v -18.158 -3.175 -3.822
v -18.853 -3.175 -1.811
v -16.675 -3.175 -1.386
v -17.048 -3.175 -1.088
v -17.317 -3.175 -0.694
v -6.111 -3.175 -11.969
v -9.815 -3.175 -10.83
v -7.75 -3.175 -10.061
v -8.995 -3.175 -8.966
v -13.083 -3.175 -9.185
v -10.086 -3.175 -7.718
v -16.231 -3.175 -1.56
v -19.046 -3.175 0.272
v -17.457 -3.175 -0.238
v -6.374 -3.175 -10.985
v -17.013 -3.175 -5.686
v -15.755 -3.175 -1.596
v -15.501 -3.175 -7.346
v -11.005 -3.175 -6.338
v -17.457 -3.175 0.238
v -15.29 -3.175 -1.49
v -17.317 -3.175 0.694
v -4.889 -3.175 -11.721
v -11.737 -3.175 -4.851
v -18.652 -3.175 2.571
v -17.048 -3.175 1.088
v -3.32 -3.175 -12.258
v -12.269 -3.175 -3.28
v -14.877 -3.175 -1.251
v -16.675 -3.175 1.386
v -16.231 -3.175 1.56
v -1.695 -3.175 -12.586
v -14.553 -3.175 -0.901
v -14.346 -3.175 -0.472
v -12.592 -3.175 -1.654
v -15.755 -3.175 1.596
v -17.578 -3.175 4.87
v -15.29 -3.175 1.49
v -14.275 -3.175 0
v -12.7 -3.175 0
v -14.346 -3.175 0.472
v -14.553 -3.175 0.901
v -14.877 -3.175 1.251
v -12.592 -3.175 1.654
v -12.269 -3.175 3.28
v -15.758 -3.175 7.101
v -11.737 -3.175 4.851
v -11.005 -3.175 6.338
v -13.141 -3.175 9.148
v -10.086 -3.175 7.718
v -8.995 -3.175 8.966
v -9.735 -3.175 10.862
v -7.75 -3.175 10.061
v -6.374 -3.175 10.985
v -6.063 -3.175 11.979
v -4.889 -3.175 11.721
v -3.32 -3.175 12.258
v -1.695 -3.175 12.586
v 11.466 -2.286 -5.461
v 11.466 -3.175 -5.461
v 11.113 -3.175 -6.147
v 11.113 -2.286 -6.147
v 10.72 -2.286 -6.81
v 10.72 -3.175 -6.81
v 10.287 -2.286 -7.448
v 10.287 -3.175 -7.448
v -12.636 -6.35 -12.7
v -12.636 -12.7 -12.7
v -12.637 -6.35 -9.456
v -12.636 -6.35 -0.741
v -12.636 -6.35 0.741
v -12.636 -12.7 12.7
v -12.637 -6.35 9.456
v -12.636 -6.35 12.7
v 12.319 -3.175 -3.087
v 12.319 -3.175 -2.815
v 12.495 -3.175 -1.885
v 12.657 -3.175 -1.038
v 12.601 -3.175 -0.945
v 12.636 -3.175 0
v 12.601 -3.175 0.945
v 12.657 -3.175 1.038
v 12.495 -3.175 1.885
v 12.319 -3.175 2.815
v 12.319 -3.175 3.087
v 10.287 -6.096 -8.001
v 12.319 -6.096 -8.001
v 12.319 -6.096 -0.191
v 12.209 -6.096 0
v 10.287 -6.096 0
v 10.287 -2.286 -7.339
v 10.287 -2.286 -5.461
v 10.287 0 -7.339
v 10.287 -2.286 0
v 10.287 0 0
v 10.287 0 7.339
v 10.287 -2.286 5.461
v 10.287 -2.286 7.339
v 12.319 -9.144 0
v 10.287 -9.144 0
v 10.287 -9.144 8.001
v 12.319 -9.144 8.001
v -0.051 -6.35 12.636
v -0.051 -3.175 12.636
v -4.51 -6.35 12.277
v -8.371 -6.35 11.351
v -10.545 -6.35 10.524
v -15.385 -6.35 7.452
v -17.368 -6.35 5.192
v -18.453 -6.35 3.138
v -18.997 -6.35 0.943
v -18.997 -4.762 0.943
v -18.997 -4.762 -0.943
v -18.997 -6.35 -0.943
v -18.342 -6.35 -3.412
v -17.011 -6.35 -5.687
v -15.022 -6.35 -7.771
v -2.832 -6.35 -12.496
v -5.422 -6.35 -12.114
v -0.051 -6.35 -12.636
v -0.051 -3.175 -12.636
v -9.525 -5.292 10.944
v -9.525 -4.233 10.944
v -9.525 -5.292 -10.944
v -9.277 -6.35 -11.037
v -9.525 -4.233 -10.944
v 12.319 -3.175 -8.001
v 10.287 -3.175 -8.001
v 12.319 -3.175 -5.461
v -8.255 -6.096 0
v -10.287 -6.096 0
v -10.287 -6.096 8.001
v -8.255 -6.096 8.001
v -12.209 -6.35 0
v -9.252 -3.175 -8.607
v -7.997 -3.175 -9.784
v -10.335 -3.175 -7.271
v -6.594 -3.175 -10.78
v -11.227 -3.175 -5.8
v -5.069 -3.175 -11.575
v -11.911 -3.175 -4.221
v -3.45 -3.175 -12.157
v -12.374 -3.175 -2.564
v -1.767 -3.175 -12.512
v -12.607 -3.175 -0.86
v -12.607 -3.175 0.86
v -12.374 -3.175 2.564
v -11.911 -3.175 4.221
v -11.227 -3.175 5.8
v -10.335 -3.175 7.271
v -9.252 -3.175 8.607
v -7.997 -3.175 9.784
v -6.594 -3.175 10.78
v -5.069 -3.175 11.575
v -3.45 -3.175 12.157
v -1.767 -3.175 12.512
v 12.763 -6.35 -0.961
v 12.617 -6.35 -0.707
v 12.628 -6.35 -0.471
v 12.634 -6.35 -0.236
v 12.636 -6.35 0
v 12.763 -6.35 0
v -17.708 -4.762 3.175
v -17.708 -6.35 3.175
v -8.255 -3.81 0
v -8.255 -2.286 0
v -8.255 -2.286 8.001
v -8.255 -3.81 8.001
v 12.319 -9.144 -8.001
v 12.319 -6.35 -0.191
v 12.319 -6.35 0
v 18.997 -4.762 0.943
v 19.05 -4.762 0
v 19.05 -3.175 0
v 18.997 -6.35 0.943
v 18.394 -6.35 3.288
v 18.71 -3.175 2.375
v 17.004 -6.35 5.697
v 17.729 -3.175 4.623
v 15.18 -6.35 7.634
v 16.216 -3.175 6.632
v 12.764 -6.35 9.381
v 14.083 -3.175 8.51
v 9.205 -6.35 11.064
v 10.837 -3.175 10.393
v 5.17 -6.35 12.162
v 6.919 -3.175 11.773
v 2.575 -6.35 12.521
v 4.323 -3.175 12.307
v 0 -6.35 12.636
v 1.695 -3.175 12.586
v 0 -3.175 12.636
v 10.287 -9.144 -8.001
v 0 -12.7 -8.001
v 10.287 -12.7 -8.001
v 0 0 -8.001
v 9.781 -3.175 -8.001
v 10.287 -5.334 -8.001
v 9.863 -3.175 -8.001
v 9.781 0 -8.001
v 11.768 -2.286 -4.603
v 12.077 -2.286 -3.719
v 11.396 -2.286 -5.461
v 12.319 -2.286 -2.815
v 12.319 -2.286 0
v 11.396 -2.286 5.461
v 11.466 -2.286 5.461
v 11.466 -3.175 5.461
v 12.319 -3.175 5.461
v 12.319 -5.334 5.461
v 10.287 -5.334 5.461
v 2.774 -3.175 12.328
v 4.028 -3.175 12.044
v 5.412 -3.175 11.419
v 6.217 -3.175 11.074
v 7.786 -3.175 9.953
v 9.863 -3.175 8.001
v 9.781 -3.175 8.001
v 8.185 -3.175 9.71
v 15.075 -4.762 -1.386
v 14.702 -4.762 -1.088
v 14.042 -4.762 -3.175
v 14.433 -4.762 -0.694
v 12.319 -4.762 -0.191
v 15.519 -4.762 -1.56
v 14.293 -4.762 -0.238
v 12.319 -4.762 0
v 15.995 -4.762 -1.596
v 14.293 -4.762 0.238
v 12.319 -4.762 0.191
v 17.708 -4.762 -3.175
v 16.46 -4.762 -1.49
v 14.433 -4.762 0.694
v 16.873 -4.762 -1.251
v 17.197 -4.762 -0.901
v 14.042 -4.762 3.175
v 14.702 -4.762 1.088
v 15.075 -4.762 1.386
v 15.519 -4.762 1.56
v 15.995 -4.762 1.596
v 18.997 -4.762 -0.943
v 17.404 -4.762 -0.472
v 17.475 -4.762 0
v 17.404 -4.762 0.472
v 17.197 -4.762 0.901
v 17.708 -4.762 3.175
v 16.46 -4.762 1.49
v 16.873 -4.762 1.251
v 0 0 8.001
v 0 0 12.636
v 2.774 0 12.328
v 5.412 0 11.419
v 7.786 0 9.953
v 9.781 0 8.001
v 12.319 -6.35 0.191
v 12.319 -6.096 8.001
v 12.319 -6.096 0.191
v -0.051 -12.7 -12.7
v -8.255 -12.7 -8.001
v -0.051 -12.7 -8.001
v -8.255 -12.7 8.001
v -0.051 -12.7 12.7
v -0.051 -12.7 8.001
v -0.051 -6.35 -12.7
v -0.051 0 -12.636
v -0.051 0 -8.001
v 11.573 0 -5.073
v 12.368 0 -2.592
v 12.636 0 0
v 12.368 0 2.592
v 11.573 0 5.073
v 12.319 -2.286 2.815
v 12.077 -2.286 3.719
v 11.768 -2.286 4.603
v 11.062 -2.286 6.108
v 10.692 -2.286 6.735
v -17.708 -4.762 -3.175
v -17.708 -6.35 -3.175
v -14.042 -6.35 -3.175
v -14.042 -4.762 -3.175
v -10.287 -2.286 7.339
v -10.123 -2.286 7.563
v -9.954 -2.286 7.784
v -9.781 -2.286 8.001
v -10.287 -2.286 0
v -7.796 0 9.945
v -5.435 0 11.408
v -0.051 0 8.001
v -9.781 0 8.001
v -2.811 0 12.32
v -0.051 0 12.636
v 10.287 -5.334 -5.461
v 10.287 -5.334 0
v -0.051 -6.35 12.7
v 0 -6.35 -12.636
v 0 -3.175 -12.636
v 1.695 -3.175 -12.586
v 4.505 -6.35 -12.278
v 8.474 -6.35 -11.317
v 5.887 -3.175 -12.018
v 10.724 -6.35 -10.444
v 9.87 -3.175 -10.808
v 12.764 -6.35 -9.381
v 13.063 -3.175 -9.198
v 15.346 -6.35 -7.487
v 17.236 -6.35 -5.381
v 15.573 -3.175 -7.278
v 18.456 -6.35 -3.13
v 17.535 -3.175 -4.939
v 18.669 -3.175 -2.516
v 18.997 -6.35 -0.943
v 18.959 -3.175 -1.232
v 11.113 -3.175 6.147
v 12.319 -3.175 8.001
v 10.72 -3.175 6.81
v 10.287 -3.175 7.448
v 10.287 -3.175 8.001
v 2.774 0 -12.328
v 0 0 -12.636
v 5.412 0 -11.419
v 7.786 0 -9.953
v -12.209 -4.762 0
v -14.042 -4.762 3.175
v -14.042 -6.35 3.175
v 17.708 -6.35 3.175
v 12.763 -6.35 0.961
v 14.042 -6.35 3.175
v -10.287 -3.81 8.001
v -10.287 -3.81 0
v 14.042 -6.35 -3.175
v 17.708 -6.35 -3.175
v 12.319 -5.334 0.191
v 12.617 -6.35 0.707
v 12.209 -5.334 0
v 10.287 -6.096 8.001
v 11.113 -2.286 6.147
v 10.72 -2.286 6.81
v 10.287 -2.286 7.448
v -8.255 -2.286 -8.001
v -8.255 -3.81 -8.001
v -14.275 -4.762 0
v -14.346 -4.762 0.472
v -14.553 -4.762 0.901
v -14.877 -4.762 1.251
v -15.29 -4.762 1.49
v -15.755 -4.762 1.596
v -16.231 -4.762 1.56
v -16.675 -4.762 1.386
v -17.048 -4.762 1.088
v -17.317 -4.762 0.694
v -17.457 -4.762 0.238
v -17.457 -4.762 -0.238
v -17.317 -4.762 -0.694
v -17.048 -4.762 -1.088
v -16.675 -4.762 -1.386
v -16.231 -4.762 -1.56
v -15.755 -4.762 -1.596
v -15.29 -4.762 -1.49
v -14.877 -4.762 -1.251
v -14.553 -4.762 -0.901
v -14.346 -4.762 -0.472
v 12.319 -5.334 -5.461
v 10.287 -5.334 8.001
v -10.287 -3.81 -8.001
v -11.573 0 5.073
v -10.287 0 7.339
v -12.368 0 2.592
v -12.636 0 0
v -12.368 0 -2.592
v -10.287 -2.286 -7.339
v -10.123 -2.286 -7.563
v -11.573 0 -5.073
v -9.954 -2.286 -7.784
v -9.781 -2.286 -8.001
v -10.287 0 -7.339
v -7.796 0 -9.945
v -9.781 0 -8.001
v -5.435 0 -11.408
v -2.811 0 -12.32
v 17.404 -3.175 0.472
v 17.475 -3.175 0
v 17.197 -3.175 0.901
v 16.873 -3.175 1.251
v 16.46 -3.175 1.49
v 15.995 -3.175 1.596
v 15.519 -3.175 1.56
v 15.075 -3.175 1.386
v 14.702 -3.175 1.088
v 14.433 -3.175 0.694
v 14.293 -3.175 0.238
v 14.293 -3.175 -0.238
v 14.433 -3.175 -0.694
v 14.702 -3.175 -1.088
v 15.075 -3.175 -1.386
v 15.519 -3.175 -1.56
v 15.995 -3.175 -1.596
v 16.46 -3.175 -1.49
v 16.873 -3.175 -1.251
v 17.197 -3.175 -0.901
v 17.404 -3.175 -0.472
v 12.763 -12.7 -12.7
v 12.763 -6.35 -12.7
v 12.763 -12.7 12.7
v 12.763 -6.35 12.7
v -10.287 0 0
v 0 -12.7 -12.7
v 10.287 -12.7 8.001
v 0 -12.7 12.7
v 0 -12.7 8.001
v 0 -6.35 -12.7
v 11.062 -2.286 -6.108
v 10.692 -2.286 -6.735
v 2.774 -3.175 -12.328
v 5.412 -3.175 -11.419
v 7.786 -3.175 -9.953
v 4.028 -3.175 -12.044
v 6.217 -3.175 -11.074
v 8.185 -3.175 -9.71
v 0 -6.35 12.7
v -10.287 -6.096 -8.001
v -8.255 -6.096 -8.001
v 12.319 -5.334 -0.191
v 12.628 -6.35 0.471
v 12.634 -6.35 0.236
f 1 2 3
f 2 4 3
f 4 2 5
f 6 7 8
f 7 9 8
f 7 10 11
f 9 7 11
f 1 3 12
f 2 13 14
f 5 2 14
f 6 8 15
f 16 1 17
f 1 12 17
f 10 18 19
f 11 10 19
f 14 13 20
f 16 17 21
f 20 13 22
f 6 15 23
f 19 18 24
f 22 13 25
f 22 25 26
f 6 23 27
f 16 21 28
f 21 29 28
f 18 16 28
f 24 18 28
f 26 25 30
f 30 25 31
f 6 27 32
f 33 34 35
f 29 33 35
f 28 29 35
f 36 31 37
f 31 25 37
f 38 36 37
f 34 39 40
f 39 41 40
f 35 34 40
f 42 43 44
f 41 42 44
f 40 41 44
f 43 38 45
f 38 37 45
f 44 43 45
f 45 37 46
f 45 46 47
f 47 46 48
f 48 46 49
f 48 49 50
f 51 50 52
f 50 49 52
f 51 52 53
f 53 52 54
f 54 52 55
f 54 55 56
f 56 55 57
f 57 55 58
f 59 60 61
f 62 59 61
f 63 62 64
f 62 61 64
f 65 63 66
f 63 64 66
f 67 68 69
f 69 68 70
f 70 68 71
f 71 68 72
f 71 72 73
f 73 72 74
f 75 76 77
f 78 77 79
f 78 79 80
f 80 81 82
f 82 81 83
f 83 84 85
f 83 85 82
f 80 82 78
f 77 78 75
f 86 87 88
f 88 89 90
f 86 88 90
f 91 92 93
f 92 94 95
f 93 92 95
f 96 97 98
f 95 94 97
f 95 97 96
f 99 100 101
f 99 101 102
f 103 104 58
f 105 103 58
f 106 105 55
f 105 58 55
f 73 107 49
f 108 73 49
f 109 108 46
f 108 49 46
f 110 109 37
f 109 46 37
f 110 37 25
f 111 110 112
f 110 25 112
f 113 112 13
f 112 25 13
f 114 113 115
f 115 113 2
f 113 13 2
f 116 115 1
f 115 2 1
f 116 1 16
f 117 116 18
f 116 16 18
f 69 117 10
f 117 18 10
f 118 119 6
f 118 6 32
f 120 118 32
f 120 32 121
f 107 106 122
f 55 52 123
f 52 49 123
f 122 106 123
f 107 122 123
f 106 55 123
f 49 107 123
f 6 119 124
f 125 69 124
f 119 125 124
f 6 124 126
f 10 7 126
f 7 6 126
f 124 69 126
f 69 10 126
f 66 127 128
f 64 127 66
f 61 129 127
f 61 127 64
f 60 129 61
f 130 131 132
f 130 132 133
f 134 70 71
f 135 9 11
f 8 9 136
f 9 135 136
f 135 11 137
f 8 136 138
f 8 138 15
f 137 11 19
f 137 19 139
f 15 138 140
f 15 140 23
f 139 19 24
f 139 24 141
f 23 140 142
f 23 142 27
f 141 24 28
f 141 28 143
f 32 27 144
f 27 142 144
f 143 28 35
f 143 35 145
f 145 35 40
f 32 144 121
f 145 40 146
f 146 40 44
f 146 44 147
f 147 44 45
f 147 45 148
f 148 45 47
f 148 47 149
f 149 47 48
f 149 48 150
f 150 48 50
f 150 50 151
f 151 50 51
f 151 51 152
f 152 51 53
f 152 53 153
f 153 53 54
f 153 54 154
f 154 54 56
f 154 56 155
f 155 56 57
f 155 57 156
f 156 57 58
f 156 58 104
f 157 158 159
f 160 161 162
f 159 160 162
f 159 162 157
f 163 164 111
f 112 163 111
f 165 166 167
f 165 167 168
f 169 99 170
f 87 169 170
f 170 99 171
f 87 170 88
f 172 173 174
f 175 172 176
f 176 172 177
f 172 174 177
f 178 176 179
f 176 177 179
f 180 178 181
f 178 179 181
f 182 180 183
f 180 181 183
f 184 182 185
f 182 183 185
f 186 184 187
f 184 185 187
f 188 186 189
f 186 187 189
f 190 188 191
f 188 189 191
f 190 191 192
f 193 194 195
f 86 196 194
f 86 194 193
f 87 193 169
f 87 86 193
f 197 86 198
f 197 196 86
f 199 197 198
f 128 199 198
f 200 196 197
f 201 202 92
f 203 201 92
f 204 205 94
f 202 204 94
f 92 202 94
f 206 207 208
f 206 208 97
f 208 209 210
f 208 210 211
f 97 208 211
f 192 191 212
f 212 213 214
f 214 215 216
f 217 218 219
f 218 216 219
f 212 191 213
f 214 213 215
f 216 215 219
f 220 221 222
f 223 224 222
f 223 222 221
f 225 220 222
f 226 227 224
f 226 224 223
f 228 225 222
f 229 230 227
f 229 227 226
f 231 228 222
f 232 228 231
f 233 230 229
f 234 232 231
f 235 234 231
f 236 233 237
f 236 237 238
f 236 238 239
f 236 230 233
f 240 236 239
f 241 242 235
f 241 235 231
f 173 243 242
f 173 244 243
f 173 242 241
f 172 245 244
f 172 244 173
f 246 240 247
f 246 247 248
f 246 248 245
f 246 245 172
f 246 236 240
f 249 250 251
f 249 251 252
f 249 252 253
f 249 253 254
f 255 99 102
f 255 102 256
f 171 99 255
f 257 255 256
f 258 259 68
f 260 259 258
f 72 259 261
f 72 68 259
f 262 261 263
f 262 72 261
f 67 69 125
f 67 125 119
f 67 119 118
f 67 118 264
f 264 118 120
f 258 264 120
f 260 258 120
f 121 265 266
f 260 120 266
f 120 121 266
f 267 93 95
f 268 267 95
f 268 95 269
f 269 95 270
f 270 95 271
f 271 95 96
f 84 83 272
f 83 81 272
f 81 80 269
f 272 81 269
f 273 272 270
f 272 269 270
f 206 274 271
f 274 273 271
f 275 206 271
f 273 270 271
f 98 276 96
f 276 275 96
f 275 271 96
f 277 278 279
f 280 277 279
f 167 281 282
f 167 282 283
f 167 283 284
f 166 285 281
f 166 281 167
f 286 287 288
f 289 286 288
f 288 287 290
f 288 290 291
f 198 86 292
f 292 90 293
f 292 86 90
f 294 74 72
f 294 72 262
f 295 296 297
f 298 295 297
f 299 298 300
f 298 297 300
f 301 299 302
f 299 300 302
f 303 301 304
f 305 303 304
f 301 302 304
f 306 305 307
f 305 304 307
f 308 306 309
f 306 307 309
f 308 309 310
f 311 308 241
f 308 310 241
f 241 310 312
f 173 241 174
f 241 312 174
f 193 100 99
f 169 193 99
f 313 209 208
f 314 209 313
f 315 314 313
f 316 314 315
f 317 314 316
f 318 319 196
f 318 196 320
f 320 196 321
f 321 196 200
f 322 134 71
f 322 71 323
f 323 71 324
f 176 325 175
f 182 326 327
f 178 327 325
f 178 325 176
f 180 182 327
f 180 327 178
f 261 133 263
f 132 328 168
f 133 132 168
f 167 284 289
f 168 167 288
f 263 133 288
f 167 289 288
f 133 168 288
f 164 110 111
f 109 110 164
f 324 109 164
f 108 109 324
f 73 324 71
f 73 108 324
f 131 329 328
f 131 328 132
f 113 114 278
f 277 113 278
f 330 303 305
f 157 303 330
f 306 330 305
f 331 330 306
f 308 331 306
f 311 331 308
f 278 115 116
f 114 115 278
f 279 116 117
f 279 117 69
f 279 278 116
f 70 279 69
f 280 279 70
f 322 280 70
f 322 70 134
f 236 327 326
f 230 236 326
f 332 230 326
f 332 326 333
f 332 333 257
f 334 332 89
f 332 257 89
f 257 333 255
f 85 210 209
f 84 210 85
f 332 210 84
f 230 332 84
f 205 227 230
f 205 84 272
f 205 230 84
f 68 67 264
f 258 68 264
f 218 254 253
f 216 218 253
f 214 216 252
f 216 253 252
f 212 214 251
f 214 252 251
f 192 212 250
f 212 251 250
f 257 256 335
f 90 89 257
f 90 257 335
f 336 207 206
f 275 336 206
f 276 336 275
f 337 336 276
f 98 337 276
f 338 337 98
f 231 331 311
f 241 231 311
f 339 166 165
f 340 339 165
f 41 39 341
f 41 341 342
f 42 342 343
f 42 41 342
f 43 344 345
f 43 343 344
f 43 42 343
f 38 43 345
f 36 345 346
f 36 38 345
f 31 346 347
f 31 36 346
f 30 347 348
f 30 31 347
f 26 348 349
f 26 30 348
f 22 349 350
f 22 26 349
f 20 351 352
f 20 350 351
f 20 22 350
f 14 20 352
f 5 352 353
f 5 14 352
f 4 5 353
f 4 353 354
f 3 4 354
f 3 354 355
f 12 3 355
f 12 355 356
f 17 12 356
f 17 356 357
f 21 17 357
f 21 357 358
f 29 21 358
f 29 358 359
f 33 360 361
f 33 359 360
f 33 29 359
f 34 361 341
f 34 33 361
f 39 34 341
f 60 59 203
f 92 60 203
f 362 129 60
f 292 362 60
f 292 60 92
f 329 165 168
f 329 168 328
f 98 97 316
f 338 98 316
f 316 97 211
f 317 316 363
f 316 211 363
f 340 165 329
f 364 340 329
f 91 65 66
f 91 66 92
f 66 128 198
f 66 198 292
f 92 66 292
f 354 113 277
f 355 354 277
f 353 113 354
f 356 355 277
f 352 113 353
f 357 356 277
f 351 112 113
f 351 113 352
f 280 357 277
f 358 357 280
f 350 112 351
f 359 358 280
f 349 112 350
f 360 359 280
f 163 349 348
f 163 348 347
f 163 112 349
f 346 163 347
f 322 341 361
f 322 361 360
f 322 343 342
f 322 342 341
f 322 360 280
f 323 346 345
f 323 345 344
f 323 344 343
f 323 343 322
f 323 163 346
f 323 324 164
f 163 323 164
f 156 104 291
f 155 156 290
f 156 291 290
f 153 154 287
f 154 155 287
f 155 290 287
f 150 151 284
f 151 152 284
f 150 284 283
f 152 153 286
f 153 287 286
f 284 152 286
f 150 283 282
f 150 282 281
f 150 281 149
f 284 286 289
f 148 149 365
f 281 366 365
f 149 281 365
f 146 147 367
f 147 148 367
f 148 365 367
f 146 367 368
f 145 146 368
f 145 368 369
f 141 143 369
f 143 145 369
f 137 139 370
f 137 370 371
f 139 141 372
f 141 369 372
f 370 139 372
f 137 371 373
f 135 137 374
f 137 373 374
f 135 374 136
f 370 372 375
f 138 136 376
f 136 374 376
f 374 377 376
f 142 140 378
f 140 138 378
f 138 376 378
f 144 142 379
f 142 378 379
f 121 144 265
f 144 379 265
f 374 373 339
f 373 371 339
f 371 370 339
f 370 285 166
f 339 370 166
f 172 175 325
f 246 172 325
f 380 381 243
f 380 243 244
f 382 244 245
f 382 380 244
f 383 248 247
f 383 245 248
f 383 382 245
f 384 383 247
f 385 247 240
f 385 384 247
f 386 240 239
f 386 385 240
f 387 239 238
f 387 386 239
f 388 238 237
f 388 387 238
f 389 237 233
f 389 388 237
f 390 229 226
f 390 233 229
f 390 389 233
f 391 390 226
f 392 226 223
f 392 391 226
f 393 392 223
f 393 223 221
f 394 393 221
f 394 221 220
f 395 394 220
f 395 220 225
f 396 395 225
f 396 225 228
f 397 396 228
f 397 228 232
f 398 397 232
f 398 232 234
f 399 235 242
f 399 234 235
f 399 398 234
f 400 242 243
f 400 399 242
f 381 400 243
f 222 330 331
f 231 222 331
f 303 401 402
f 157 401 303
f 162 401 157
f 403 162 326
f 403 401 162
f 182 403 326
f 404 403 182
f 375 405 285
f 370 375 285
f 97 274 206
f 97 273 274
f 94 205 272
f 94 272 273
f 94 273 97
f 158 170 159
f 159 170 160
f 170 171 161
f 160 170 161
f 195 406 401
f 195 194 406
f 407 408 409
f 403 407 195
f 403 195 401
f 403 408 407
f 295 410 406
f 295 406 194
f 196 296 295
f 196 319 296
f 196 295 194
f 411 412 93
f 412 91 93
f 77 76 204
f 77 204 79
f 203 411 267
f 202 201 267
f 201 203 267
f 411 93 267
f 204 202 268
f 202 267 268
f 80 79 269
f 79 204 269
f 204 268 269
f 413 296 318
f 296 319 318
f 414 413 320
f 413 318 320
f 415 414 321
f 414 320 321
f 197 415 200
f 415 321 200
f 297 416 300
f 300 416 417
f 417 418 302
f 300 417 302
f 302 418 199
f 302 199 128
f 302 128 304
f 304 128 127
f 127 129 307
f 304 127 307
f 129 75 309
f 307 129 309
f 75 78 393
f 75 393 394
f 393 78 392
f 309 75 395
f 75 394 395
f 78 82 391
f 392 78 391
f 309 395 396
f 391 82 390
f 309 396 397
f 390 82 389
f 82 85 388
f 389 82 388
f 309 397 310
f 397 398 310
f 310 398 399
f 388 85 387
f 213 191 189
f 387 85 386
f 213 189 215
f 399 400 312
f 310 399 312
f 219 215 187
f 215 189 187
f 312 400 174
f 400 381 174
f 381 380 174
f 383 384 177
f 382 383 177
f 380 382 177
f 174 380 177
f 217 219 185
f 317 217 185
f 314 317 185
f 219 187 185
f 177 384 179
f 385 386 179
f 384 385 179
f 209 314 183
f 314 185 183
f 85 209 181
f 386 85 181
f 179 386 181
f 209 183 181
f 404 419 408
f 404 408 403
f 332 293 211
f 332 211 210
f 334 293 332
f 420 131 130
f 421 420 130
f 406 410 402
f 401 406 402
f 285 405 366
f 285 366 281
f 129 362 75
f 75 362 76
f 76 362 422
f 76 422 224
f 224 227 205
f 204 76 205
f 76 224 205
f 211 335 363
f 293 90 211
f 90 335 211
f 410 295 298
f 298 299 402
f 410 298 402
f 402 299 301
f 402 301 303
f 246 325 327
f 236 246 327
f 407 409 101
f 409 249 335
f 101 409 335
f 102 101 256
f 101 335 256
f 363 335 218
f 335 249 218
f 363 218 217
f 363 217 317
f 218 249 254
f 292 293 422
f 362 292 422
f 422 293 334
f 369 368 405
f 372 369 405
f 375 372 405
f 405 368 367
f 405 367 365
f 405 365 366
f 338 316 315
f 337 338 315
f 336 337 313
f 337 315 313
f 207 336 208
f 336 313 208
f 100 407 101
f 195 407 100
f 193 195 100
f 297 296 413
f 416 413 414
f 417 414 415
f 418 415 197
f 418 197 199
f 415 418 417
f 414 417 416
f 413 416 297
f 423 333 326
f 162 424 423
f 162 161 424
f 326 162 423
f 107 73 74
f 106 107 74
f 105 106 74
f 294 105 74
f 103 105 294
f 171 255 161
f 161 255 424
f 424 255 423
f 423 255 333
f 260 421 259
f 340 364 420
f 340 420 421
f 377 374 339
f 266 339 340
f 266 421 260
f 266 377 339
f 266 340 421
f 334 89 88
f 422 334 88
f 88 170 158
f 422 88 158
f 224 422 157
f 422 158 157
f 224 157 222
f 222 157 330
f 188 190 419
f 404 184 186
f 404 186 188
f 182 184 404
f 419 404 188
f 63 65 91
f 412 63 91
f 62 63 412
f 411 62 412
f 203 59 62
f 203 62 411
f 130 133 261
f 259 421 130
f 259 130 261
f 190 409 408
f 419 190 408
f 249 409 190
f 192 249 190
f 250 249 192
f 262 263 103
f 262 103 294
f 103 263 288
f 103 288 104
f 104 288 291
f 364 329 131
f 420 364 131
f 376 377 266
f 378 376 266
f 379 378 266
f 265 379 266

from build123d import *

# Parameters (mm, degrees)
F0_R           = 12.6365
F1_DEPTH       = 12.7
F3_START       = 3.175
F3_DEPTH       = 3.175
F4_R           = 1.6002
F5_DEPTH       = 12.701
F7_DEPTH       = 1.5875
F8_W           = 25.4
F8_H           = 6.35
F9_DEPTH       = 12.7
F9_DEPTH_BACK  = 12.7
F11_DEPTH      = 8.001
F11_DEPTH_BACK = 8.001
F12_W          = 0.0508
F12_H          = 50.8
F13_DEPTH      = 12.701
F14_W          = 2.032
F14_H          = 2.54
F15_DEPTH      = 3.048
F16_W          = 47.6237311959
F16_H          = 44.0488960594
F16_R          = 12.7
F17_DEPTH      = 25.4


with BuildPart() as f1:
    # F0 (on Front) → F1 (new body)
    with BuildSketch(Plane.XZ):
        Circle(F0_R)
    extrude(amount=F1_DEPTH)

    # F2 (on Front) → F3 (join)
    with BuildSketch(Plane.XZ.offset(F3_START)):
        with BuildLine():
            add(Edge.make_bspline(
                [(19.05, 0), (19.05, 21.8870600298), (-9.525, 10.9435300149), (-38.1, 0), (-9.525, -10.9435300149), (19.05, -21.8870600298), (19.05, 0)],
                knots=[0, 0, 0, 2.0943951024, 2.0943951024, 4.1887902048, 4.1887902048, 6.2831853072, 6.2831853072, 6.2831853072], degree=2, weights=[1, 0.5, 1, 0.5, 1, 0.5, 1]))
        make_face()
    extrude(amount=F3_DEPTH)

    # F4 (on Front) → F5 (cut, through all)
    with BuildSketch(Plane.XZ):
        with Locations((15.875, 0)):
            Circle(F4_R)
        with Locations((-15.875, 0)):
            Circle(F4_R)
    extrude(amount=F5_DEPTH, mode=Mode.SUBTRACT)

    # F6 (on face) → F7 (cut)
    with BuildSketch(Plane.XZ.offset(6.35)):
        Polygon((-14.0419128953, 3.175), (-17.7080871047, 3.175), (-19.5411742094, 0), (-17.7080871047, -3.175), (-14.0419128953, -3.175), (-12.2088257906, 0), align=None)
        Polygon((14.0419128953, -3.175), (17.7080871047, -3.175), (19.5411742094, 0), (17.7080871047, 3.175), (14.0419128953, 3.175), (12.2088257906, 0), align=None)
    extrude(amount=-F7_DEPTH, mode=Mode.SUBTRACT)

    # F8 (on Top) → F9 (join, two sides)
    with BuildSketch(Plane.XY) as f9_sk:
        with Locations((0.0635, -9.525)):
            Rectangle(F8_W, F8_H)
    extrude(amount=F9_DEPTH)
    extrude(f9_sk.sketch, amount=-F9_DEPTH_BACK)

    # F10 (on Top) → F11 (cut, two sides)
    with BuildSketch(Plane.XY) as f11_sk:
        Polygon((10.287, -2.286), (10.287, 0), (-10.287, 0), (-10.287, -2.286), (-8.255, -2.286), (-8.255, -3.81), (-10.287, -3.81), (-10.287, -6.096), (-8.255, -6.096), (-8.255, -19.1497133717), (10.287, -19.1497133717), (10.287, -9.144), (12.319, -9.144), (12.319, -6.096), (10.287, -6.096), (10.287, -5.334), (12.319, -5.334), (12.319, -2.286), align=None)
    extrude(amount=F11_DEPTH, mode=Mode.SUBTRACT)
    extrude(f11_sk.sketch, amount=-F11_DEPTH_BACK, mode=Mode.SUBTRACT)

    # F12 (on Front) → F13 (cut, through all)
    with BuildSketch(Plane.XZ):
        with Locations((-0.0254, 2.8806983769)):
            Rectangle(F12_W, F12_H)
    extrude(amount=F13_DEPTH, mode=Mode.SUBTRACT)

    # F14 (on face) → F15 (join)
    with BuildSketch(Plane(origin=(0, -5.334, 0), x_dir=(-1, 0, 0), z_dir=(0, 1, 0))):
        with Locations((-11.303, 6.731)):
            Rectangle(F14_W, F14_H)
        with Locations((-11.303, -6.731)):
            Rectangle(F14_W, F14_H)
    extrude(amount=F15_DEPTH)

    # F16 (on face) → F17 (cut)
    with BuildSketch(Plane(origin=(0, -3.175, 0), x_dir=(-1, 0, 0), z_dir=(0, 1, 0))):
        with Locations((3.184074536, -0.0276276842)):
            Rectangle(F16_W, F16_H)
        Circle(F16_R, mode=Mode.SUBTRACT)
    extrude(amount=F17_DEPTH, mode=Mode.SUBTRACT)


solid = f1.part
